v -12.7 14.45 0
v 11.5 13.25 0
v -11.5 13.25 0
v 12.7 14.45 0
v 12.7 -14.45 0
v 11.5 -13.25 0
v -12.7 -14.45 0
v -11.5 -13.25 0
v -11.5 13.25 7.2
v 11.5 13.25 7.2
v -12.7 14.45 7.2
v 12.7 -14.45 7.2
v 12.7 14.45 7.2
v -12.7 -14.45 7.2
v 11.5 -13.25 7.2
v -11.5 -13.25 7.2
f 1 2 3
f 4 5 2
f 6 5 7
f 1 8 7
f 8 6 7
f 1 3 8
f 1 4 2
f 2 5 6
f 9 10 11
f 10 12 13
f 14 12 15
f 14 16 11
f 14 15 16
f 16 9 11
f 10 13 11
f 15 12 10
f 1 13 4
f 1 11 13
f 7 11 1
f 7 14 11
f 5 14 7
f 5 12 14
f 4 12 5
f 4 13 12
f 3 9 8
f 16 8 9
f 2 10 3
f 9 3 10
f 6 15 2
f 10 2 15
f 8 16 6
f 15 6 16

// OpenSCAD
// it might be easier to just give it a lip of 1.2 + margin eg. 1.3
// simplies all the dimensions.

// for flange with top/bottom recesses 
// we would have 0.8 + 0.8 + 0.4 = 2mm
// while for two pieces we would get 1.2 * 2 == 2.4mm

// use singdole file and view both shapes, then just prefix with '%' when generate
// manufacturing stl

 
$fn = 20;

 
 
// Wall thickness>1.2mm, thinnest part≥0.8mm
 
wall = 1.2;    // 0.4 + 0.8
fudge = 0.2;

radii = 2;
 
innerx = 23;
innery = 26.5;  // freecad was 26. should be 26.5 or 27

outerx = 42;
outery = 48;




// need a pro-trusion to meet minimum specs - 0.2,0.2,10
%color("yellow")
 linear_extrude(10) {       
       // circ 
     translate([0, -(innery /2 + 5), 0 ] )
       circle( 3/2);         
}
      
     

// top of flat part 0.8mm. with recess to hold vertical wall. extends above horizontal
%color("yellow")
 linear_extrude(0.8) { 
 
    difference() {  
        
        group() { 
        offset(r = radii)  
            square( [outerx - radii * 2, outery - radii * 2], center = true);         
        }
    
        group() {
            square( [innerx + (wall * 2) + (fudge * 2), innery + (wall * 2) + (fudge * 2)], center = true);
            
           // have to mirror text if put on bottom  
           // text engrave min. depth is 0.8mm. and 0.8mm  width.
           // so must be put on top, even if its the inside         
           translate( [0, (innery / 2) + 3.5, 0]) 
             //mirror([1,0,0])
               // text("main06.scad", 2.5, halign = "center"); 
            text("dsn06", 5, halign = "center");
     
        }
    }
} 


// dodgerblue or royalblue
// bottom of flat part, descends below horizontal, which is butt end
%translate([0,0,-0.4]) {
   color("dodgerblue") { 
   //     color("yellow") { 
 linear_extrude(0.4) {  
    difference() {  
      
        offset(r = radii) 
           square( [outerx - radii * 2, outery - radii * 2], center = true);
        
        group() { 
           square( [innerx , innery ], center = true);
            
      
            
        }
    }
} }
}

 
//
// % transparent

// vertical wall height, for visualization only
// actually may want to generate both parts in the same file
translate([0,0,0 ] ) { 

 // eg. we (16 / 2) -0.4 - 0.4
 linear_extrude(16 / 2 - 0.4 -0.4) 
    difference() {  
        square( [innerx + (wall * 2), innery + (wall * 2)], center = true);
        square( [innerx , innery  ], center = true);
  }  
}


pad = 1;

%translate([0,0,15] ) { 

    group() {
        
     linear_extrude(16 / 2 - 0.4 -0.4) 
        difference() {  
            square( [innerx + (wall * 2), innery + (wall* 2)], center = true);
            square( [innerx , innery  ], center = true);
      }  

    translate([0,0, + 0.8  ])
     linear_extrude(16 / 2 - 1.2 -1.2)  
        difference() {  
            square( [innerx + (wall * 2) + pad, innery + (wall * 2) + pad ], center = true);
            square( [innerx , innery  ], center = true);
        }
    }
}


pad2 = 2;

%translate([0,0,25] ) { 

    group() {
        
     linear_extrude(16 / 2 - 0.4 -0.4) 
        difference() {  
            square( [innerx + (wall * 2), innery + (wall * 2) ], center = true);
            square( [innerx , innery  ], center = true);
      }  

    translate([0,0, + 0.8  ])
     linear_extrude(16 / 2 - 1.2 -1.2)  
        difference() {  
            square( [innerx + (wall * 2) + pad2, innery + (wall * 2) + pad2 ], center = true);
            square( [innerx , innery  ], center = true);
        }
    }
}





// can print derived parameter
echo (  "whoot", wall + fudge );
